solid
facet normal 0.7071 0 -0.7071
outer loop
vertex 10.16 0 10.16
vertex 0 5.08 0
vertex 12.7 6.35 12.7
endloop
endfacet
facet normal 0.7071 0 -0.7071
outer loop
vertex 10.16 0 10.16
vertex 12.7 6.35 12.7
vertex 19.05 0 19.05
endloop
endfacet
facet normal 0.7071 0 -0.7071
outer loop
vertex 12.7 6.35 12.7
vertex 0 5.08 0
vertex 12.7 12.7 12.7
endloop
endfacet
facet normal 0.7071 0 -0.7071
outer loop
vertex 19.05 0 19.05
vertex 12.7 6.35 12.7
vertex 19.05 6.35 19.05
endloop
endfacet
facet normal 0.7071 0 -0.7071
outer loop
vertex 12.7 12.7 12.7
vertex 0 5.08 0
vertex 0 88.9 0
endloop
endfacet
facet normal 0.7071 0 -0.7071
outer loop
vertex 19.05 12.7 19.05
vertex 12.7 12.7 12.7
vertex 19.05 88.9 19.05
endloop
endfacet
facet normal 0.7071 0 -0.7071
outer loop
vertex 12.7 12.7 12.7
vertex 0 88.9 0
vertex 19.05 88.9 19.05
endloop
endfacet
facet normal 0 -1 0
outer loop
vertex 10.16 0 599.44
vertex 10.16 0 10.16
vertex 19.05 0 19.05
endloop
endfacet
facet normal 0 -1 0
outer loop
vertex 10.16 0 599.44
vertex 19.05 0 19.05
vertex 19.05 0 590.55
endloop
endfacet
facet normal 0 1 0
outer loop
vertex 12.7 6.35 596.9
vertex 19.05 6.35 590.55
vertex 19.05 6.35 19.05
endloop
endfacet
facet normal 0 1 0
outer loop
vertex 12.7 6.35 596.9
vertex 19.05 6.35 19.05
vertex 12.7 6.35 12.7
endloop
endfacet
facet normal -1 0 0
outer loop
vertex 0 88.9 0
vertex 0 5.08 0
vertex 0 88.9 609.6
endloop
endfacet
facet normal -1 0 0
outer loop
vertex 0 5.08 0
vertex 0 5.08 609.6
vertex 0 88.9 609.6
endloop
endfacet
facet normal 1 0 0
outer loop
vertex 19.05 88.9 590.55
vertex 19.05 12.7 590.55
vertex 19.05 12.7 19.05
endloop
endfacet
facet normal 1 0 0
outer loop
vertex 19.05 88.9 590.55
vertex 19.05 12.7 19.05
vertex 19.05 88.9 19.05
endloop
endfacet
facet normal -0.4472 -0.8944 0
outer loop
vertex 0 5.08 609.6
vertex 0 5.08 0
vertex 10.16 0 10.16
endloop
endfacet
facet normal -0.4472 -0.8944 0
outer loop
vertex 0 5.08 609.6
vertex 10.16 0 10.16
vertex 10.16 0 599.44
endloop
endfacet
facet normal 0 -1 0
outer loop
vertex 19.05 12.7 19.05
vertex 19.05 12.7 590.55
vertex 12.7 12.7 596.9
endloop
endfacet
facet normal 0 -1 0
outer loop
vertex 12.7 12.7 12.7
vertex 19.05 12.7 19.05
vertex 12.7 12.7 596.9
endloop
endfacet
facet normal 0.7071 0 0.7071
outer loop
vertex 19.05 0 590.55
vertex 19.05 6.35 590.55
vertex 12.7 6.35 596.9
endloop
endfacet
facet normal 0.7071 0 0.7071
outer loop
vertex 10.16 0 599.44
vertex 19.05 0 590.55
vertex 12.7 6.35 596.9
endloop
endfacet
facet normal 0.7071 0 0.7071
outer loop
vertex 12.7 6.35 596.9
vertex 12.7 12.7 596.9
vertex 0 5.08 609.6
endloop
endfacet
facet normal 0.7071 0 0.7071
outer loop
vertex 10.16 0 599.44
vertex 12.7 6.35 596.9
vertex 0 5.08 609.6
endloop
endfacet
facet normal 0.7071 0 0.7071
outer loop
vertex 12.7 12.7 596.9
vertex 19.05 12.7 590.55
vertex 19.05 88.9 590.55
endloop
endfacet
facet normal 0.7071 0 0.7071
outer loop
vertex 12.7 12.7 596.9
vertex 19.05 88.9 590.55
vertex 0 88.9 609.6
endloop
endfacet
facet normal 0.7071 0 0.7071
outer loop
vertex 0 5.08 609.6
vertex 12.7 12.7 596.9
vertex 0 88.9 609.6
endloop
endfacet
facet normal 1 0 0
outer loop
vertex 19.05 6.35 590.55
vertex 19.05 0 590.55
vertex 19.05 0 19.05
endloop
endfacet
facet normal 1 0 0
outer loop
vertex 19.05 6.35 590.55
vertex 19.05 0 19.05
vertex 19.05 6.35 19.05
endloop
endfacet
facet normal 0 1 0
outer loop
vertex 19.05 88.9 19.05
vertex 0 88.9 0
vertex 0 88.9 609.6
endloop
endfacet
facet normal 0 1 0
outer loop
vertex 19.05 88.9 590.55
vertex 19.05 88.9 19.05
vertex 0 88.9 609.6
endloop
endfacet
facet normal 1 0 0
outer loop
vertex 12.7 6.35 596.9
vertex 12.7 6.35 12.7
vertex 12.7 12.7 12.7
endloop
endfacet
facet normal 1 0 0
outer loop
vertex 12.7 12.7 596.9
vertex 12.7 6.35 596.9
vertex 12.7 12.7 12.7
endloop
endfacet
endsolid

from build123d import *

# Parameters (mm, degrees)
F0_W     = 88.9
F0_H     = 609.6
F1_DEPTH = 19.05
F2_W     = 6.35
F2_H     = 609.6
F3_DEPTH = 6.35
F4_SIZE2 = 5.08
F4_SIZE  = 10.16
F6_DEPTH = 88.901


with BuildPart() as f1:
    # F0 (on Right) → F1 (new body)
    with BuildSketch(Plane.YZ):
        with Locations((44.45, 304.8)):
            Rectangle(F0_W, F0_H)
    extrude(amount=F1_DEPTH)

    # F2 (on face) → F3 (cut)
    with BuildSketch(Plane.YZ.offset(19.05)):
        with Locations((9.525, 304.8)):
            Rectangle(F2_W, F2_H)
    extrude(amount=-F3_DEPTH, mode=Mode.SUBTRACT)

    # F4
    f4_edges = [f1.edges().sort_by_distance(p)[0] for p in [
        (0, 0, 304.8),
    ]]
    chamfer(f4_edges, length=F4_SIZE, length2=F4_SIZE2)

    # F5 (on face) → F6 (cut, through all)
    with BuildSketch(Plane(origin=(0, 88.9, 0), x_dir=(-1, 0, 0), z_dir=(0, 1, 0))):
        Polygon((-19.05, 590.55), (0, 609.6), (-19.05, 609.6), align=None)
        Polygon((-19.05, 0), (0, 0), (-19.05, 19.05), align=None)
    extrude(amount=-F6_DEPTH, mode=Mode.SUBTRACT)


solid = f1.part
